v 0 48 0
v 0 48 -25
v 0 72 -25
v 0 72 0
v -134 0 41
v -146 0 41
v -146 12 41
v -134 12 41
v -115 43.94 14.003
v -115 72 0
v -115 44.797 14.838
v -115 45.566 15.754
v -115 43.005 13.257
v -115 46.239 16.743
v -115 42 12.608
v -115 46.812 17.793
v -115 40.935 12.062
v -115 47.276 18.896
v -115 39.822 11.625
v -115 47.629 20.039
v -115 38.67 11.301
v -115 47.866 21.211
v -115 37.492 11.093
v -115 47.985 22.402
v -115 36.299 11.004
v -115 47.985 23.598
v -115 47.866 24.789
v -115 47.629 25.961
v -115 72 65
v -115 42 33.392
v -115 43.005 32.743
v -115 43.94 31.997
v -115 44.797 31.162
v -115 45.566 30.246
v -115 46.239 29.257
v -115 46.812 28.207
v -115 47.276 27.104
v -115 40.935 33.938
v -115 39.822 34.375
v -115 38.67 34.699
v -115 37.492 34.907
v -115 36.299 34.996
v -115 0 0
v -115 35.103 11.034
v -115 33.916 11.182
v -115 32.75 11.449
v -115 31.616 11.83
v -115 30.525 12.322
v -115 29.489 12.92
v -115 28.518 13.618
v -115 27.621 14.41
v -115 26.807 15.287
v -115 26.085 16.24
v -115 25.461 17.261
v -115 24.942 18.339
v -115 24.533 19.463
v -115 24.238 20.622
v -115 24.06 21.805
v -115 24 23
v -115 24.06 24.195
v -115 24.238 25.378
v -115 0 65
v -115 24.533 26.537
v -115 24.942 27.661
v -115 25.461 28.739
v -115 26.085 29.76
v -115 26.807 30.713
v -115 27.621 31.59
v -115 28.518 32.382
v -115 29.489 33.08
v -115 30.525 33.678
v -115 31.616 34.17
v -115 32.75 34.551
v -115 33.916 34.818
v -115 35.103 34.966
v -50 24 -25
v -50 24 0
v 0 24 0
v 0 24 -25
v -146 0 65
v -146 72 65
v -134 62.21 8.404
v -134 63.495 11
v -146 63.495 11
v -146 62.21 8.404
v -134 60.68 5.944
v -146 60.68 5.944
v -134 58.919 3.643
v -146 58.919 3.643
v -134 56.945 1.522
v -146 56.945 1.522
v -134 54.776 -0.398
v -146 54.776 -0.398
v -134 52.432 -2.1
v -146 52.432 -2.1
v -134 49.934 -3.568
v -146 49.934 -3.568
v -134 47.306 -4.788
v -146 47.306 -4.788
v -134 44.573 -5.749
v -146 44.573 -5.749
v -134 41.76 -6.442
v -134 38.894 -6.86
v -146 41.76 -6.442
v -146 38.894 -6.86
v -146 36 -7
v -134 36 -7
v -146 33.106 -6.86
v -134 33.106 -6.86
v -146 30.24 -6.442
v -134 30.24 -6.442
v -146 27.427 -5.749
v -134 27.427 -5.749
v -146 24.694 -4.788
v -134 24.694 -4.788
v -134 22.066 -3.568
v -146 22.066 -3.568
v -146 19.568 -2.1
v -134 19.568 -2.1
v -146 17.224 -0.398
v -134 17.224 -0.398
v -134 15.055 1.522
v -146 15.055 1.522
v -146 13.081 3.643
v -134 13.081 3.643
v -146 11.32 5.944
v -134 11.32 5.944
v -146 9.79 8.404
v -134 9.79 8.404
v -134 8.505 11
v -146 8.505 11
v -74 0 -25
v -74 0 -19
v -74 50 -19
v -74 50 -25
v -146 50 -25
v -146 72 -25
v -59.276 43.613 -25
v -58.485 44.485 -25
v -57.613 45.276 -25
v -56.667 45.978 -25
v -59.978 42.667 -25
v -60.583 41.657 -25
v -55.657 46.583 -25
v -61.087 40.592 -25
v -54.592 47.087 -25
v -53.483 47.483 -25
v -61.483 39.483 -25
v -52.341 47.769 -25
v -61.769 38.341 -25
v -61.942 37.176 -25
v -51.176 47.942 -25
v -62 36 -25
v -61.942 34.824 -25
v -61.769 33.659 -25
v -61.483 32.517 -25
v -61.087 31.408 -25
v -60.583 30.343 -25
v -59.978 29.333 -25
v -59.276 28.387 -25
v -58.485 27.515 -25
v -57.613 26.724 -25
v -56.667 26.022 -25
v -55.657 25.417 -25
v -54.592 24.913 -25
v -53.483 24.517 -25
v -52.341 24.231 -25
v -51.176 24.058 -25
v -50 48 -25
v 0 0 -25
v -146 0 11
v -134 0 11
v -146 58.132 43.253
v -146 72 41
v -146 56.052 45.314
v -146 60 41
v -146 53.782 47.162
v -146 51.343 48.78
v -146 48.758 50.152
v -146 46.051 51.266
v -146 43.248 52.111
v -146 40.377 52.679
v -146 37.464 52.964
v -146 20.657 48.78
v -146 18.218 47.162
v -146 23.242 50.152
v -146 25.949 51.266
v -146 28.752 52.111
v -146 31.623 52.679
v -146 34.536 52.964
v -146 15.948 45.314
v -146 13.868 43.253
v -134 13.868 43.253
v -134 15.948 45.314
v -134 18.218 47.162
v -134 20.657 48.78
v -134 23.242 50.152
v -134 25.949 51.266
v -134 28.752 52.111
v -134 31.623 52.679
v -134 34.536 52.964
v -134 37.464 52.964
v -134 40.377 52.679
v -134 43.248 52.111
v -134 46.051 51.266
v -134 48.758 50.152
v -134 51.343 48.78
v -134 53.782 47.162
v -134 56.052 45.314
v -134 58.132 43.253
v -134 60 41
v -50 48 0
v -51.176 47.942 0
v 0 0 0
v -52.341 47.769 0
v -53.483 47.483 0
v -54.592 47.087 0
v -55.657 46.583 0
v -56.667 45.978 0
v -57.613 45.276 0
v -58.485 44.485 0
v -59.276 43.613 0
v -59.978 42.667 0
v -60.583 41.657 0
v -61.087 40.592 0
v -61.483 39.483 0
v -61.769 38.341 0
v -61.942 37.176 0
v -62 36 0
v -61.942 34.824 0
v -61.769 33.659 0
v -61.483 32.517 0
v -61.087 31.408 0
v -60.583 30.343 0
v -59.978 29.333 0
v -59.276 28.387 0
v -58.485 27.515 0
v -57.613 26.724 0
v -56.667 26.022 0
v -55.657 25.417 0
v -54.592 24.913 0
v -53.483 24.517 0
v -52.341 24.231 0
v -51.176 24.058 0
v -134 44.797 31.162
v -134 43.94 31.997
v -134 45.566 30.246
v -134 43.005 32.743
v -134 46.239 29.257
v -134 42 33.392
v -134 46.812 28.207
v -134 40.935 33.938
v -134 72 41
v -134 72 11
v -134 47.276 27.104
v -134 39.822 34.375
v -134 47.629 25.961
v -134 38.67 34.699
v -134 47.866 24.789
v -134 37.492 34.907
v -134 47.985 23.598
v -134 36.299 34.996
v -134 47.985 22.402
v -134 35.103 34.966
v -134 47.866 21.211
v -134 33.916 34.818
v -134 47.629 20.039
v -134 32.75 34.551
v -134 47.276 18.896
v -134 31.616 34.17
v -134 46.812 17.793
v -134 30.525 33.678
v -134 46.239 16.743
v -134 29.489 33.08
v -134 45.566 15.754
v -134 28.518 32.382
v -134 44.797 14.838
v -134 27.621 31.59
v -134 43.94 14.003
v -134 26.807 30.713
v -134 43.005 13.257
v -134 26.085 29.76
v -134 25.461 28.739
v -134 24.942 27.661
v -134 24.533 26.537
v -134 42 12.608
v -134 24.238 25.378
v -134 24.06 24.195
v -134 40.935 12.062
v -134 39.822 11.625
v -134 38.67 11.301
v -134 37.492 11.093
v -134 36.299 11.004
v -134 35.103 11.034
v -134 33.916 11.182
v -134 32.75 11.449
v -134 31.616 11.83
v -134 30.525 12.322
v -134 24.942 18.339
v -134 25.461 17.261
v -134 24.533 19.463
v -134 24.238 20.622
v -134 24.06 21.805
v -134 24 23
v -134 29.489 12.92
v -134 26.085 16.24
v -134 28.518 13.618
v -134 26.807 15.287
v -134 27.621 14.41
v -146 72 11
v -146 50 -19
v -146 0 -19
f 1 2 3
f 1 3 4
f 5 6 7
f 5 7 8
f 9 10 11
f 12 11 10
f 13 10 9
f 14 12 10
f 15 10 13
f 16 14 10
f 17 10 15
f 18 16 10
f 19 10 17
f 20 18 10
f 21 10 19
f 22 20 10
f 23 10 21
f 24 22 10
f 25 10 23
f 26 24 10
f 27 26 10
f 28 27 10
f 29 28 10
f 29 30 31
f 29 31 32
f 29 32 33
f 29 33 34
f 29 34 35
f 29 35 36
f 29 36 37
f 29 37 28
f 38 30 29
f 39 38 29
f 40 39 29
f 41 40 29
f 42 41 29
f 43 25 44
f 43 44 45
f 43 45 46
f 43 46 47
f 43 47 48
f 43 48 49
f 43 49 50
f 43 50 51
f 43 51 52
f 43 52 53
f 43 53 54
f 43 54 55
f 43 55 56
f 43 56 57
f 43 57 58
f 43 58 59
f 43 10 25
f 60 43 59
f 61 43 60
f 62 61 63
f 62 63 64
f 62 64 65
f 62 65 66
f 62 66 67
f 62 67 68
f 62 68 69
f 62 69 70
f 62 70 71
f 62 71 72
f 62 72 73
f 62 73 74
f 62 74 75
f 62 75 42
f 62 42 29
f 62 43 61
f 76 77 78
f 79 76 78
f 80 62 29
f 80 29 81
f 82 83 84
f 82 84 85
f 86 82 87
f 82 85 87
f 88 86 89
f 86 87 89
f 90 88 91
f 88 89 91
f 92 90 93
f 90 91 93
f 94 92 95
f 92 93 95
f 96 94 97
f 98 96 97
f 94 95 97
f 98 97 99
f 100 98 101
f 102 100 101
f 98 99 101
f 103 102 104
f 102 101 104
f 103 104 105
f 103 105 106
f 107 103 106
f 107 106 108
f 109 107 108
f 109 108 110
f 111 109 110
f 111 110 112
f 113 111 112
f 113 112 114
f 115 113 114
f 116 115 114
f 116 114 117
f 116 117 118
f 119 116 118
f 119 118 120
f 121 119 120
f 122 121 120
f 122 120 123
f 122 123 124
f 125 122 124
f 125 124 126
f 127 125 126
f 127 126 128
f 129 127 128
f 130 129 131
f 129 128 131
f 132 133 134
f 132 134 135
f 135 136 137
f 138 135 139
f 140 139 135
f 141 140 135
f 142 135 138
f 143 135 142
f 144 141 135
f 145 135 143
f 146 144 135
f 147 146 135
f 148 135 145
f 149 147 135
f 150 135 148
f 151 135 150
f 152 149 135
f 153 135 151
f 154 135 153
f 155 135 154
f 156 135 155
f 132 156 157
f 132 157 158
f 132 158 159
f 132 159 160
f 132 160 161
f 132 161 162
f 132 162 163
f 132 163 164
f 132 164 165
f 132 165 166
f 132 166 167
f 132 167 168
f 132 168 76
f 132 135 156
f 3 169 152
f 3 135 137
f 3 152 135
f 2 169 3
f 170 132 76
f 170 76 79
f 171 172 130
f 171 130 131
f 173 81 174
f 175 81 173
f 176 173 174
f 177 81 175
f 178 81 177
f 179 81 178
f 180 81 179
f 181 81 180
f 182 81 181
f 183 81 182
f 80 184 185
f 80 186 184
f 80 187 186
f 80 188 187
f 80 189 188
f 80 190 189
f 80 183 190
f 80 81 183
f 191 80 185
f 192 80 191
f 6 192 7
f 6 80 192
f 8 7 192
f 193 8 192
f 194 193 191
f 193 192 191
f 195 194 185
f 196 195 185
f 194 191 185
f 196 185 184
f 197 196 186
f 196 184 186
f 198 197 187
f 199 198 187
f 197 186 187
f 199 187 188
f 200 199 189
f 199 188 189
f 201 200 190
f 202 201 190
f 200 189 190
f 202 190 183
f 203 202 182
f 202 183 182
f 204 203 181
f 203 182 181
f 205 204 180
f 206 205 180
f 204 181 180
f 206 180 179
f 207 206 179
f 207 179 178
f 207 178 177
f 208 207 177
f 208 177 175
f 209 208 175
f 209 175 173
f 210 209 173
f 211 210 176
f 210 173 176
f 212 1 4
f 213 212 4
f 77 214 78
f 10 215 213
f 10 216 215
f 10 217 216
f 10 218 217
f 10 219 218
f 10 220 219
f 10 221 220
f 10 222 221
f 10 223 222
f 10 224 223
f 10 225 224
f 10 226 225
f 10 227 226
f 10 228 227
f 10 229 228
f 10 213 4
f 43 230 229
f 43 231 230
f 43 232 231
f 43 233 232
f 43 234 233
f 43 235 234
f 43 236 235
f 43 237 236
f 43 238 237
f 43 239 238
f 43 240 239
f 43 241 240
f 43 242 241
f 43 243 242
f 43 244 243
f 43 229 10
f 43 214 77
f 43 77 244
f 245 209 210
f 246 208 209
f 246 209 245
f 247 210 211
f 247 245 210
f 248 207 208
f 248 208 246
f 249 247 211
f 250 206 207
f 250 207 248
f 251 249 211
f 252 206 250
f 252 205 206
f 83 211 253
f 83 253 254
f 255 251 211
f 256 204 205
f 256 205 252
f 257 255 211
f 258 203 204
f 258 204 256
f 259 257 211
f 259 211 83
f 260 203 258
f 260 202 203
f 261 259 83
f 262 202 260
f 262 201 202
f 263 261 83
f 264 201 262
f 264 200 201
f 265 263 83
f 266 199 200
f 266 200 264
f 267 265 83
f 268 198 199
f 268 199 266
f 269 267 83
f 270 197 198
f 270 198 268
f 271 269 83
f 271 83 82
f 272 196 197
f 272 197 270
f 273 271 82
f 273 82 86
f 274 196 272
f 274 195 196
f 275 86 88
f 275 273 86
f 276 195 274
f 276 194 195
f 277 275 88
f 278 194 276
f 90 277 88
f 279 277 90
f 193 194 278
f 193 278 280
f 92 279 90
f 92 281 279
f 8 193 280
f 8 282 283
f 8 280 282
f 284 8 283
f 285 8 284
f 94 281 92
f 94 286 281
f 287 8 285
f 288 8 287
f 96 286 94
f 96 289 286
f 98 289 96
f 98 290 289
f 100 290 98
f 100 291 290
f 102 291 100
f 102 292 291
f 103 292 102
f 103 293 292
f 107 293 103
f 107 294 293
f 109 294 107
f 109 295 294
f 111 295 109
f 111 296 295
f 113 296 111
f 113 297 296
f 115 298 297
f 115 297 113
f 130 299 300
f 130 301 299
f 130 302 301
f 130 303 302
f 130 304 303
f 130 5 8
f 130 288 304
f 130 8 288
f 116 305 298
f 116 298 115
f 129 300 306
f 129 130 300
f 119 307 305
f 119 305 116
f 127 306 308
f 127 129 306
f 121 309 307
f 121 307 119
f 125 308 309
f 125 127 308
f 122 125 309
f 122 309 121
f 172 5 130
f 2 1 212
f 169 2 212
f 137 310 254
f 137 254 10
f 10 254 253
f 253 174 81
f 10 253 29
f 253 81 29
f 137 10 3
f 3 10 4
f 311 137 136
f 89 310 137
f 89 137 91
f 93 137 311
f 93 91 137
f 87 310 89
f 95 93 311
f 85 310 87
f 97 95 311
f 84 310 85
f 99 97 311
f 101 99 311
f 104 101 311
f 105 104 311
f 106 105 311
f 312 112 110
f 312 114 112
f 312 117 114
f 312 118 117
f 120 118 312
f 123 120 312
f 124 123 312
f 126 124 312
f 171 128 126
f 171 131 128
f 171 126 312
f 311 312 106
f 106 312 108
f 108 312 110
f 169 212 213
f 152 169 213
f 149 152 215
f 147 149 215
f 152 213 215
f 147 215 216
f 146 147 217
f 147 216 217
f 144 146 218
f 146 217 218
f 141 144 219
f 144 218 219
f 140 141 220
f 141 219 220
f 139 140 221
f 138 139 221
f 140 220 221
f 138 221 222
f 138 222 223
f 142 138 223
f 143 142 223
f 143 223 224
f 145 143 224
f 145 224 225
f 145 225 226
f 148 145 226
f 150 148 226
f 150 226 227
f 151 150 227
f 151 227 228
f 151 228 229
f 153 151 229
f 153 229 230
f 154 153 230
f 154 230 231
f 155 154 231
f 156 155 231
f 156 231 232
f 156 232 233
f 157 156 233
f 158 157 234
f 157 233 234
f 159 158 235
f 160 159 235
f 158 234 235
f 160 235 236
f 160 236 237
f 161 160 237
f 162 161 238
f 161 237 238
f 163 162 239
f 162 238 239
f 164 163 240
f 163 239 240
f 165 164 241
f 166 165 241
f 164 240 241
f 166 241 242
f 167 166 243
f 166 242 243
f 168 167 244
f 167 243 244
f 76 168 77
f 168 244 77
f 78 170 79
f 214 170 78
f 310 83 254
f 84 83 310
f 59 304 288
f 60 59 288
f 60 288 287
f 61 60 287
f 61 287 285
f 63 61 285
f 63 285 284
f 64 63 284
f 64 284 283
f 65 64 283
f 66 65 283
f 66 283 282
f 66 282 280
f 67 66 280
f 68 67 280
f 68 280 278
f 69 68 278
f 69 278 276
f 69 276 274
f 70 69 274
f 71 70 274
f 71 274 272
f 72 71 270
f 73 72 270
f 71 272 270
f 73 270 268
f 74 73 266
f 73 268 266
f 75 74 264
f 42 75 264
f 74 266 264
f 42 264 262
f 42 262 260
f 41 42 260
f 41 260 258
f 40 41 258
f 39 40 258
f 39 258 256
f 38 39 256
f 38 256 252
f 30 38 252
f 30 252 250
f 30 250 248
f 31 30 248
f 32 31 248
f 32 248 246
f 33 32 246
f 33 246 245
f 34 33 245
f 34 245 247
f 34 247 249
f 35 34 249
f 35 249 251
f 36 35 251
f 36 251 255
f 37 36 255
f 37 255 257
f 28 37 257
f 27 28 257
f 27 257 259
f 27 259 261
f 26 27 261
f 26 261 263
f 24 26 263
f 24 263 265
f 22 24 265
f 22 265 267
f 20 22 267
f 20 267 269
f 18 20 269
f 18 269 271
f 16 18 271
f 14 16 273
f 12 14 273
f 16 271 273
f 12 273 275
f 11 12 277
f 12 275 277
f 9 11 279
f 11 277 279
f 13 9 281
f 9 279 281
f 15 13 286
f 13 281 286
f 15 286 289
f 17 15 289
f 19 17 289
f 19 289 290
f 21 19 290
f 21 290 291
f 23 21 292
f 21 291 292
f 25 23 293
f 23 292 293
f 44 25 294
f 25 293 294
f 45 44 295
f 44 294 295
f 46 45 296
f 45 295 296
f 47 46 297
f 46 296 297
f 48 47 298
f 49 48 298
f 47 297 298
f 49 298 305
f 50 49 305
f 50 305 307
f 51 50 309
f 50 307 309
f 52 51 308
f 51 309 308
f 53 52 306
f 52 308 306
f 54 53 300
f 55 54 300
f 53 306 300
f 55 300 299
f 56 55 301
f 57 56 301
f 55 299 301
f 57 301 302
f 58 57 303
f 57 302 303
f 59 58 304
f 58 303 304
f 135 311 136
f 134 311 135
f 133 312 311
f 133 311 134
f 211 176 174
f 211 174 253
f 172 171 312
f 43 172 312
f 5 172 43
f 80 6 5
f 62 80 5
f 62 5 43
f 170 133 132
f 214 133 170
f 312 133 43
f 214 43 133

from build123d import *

# Parameters (mm, degrees)
F2_DEPTH  = 72
F3_W      = 72
F3_H      = 22
F4_DEPTH  = 6
F6_DEPTH  = 25.001
F8_DEPTH  = 12
F10_DEPTH = 12
F11_R     = 12
F12_DEPTH = 134.001


with BuildPart() as f2:
    # F0 (on Front) → F2 (new body)
    with BuildSketch(Plane.XZ):
        Polygon((-134, 11), (-146, 11), (-146, -19), (-74, -19), (-74, -25), (0, -25), (0, 0), (-115, 0), (-115, 65), (-146, 65), (-146, 41), (-134, 41), align=None)
    extrude(amount=-F2_DEPTH)

    # F3 (on face) → F4 (join)
    with BuildSketch(Plane(origin=(0, 0, -19), x_dir=(1, 0, 0), z_dir=(0, 0, -1))):
        with Locations((-110, -61)):
            Rectangle(F3_W, F3_H)
    extrude(amount=F4_DEPTH)

    # F5 (on Top) → F6 (cut, through all)
    with BuildSketch(Plane.XY):
        with BuildLine():
            Line((-50, 24), (0, 24))
            Line((0, 24), (0, 48))
            Line((0, 48), (-50, 48))
            ThreePointArc((-50, 48), (-62, 36), (-50, 24))
        make_face()
    extrude(amount=-F6_DEPTH, mode=Mode.SUBTRACT)

    # F7 (on face) → F8 (cut)
    with BuildSketch(Plane(origin=(-146, 0, 0), x_dir=(0, -1, 0), z_dir=(-1, 0, 0))):
        with BuildLine():
            Line((-13.861853, 11), (-58.138147, 11))
            ThreePointArc((-58.138147, 11), (-36, 1.246048), (-13.861853, 11))
        make_face()
    extrude(amount=-F8_DEPTH, mode=Mode.SUBTRACT)

    # F9 (on face) → F10 (cut)
    with BuildSketch(Plane(origin=(-146, 0, 0), x_dir=(0, -1, 0), z_dir=(-1, 0, 0))):
        with BuildLine():
            Line((-60, 41), (-12, 41))
            ThreePointArc((-12, 41), (-36, 53), (-60, 41))
        make_face()
        with BuildLine():
            Line((-6.492059, 17.588768), (-8.615558, 35.251218))
            ThreePointArc((-8.615558, 35.251218), (-10.147489, 38.219976), (-12, 41))
            Line((-12, 41), (-60, 41))
            ThreePointArc((-60, 41), (-48.025215, -4.484436), (-6.492059, 17.588768))
        make_face()
    extrude(amount=-F10_DEPTH, mode=Mode.SUBTRACT)

    # F11 (on face) → F12 (cut, through all)
    with BuildSketch(Plane(origin=(-134, 0, 0), x_dir=(0, -1, 0), z_dir=(-1, 0, 0))):
        with Locations((-36, 23)):
            Circle(F11_R)
    extrude(amount=-F12_DEPTH, mode=Mode.SUBTRACT)


solid = f2.part
